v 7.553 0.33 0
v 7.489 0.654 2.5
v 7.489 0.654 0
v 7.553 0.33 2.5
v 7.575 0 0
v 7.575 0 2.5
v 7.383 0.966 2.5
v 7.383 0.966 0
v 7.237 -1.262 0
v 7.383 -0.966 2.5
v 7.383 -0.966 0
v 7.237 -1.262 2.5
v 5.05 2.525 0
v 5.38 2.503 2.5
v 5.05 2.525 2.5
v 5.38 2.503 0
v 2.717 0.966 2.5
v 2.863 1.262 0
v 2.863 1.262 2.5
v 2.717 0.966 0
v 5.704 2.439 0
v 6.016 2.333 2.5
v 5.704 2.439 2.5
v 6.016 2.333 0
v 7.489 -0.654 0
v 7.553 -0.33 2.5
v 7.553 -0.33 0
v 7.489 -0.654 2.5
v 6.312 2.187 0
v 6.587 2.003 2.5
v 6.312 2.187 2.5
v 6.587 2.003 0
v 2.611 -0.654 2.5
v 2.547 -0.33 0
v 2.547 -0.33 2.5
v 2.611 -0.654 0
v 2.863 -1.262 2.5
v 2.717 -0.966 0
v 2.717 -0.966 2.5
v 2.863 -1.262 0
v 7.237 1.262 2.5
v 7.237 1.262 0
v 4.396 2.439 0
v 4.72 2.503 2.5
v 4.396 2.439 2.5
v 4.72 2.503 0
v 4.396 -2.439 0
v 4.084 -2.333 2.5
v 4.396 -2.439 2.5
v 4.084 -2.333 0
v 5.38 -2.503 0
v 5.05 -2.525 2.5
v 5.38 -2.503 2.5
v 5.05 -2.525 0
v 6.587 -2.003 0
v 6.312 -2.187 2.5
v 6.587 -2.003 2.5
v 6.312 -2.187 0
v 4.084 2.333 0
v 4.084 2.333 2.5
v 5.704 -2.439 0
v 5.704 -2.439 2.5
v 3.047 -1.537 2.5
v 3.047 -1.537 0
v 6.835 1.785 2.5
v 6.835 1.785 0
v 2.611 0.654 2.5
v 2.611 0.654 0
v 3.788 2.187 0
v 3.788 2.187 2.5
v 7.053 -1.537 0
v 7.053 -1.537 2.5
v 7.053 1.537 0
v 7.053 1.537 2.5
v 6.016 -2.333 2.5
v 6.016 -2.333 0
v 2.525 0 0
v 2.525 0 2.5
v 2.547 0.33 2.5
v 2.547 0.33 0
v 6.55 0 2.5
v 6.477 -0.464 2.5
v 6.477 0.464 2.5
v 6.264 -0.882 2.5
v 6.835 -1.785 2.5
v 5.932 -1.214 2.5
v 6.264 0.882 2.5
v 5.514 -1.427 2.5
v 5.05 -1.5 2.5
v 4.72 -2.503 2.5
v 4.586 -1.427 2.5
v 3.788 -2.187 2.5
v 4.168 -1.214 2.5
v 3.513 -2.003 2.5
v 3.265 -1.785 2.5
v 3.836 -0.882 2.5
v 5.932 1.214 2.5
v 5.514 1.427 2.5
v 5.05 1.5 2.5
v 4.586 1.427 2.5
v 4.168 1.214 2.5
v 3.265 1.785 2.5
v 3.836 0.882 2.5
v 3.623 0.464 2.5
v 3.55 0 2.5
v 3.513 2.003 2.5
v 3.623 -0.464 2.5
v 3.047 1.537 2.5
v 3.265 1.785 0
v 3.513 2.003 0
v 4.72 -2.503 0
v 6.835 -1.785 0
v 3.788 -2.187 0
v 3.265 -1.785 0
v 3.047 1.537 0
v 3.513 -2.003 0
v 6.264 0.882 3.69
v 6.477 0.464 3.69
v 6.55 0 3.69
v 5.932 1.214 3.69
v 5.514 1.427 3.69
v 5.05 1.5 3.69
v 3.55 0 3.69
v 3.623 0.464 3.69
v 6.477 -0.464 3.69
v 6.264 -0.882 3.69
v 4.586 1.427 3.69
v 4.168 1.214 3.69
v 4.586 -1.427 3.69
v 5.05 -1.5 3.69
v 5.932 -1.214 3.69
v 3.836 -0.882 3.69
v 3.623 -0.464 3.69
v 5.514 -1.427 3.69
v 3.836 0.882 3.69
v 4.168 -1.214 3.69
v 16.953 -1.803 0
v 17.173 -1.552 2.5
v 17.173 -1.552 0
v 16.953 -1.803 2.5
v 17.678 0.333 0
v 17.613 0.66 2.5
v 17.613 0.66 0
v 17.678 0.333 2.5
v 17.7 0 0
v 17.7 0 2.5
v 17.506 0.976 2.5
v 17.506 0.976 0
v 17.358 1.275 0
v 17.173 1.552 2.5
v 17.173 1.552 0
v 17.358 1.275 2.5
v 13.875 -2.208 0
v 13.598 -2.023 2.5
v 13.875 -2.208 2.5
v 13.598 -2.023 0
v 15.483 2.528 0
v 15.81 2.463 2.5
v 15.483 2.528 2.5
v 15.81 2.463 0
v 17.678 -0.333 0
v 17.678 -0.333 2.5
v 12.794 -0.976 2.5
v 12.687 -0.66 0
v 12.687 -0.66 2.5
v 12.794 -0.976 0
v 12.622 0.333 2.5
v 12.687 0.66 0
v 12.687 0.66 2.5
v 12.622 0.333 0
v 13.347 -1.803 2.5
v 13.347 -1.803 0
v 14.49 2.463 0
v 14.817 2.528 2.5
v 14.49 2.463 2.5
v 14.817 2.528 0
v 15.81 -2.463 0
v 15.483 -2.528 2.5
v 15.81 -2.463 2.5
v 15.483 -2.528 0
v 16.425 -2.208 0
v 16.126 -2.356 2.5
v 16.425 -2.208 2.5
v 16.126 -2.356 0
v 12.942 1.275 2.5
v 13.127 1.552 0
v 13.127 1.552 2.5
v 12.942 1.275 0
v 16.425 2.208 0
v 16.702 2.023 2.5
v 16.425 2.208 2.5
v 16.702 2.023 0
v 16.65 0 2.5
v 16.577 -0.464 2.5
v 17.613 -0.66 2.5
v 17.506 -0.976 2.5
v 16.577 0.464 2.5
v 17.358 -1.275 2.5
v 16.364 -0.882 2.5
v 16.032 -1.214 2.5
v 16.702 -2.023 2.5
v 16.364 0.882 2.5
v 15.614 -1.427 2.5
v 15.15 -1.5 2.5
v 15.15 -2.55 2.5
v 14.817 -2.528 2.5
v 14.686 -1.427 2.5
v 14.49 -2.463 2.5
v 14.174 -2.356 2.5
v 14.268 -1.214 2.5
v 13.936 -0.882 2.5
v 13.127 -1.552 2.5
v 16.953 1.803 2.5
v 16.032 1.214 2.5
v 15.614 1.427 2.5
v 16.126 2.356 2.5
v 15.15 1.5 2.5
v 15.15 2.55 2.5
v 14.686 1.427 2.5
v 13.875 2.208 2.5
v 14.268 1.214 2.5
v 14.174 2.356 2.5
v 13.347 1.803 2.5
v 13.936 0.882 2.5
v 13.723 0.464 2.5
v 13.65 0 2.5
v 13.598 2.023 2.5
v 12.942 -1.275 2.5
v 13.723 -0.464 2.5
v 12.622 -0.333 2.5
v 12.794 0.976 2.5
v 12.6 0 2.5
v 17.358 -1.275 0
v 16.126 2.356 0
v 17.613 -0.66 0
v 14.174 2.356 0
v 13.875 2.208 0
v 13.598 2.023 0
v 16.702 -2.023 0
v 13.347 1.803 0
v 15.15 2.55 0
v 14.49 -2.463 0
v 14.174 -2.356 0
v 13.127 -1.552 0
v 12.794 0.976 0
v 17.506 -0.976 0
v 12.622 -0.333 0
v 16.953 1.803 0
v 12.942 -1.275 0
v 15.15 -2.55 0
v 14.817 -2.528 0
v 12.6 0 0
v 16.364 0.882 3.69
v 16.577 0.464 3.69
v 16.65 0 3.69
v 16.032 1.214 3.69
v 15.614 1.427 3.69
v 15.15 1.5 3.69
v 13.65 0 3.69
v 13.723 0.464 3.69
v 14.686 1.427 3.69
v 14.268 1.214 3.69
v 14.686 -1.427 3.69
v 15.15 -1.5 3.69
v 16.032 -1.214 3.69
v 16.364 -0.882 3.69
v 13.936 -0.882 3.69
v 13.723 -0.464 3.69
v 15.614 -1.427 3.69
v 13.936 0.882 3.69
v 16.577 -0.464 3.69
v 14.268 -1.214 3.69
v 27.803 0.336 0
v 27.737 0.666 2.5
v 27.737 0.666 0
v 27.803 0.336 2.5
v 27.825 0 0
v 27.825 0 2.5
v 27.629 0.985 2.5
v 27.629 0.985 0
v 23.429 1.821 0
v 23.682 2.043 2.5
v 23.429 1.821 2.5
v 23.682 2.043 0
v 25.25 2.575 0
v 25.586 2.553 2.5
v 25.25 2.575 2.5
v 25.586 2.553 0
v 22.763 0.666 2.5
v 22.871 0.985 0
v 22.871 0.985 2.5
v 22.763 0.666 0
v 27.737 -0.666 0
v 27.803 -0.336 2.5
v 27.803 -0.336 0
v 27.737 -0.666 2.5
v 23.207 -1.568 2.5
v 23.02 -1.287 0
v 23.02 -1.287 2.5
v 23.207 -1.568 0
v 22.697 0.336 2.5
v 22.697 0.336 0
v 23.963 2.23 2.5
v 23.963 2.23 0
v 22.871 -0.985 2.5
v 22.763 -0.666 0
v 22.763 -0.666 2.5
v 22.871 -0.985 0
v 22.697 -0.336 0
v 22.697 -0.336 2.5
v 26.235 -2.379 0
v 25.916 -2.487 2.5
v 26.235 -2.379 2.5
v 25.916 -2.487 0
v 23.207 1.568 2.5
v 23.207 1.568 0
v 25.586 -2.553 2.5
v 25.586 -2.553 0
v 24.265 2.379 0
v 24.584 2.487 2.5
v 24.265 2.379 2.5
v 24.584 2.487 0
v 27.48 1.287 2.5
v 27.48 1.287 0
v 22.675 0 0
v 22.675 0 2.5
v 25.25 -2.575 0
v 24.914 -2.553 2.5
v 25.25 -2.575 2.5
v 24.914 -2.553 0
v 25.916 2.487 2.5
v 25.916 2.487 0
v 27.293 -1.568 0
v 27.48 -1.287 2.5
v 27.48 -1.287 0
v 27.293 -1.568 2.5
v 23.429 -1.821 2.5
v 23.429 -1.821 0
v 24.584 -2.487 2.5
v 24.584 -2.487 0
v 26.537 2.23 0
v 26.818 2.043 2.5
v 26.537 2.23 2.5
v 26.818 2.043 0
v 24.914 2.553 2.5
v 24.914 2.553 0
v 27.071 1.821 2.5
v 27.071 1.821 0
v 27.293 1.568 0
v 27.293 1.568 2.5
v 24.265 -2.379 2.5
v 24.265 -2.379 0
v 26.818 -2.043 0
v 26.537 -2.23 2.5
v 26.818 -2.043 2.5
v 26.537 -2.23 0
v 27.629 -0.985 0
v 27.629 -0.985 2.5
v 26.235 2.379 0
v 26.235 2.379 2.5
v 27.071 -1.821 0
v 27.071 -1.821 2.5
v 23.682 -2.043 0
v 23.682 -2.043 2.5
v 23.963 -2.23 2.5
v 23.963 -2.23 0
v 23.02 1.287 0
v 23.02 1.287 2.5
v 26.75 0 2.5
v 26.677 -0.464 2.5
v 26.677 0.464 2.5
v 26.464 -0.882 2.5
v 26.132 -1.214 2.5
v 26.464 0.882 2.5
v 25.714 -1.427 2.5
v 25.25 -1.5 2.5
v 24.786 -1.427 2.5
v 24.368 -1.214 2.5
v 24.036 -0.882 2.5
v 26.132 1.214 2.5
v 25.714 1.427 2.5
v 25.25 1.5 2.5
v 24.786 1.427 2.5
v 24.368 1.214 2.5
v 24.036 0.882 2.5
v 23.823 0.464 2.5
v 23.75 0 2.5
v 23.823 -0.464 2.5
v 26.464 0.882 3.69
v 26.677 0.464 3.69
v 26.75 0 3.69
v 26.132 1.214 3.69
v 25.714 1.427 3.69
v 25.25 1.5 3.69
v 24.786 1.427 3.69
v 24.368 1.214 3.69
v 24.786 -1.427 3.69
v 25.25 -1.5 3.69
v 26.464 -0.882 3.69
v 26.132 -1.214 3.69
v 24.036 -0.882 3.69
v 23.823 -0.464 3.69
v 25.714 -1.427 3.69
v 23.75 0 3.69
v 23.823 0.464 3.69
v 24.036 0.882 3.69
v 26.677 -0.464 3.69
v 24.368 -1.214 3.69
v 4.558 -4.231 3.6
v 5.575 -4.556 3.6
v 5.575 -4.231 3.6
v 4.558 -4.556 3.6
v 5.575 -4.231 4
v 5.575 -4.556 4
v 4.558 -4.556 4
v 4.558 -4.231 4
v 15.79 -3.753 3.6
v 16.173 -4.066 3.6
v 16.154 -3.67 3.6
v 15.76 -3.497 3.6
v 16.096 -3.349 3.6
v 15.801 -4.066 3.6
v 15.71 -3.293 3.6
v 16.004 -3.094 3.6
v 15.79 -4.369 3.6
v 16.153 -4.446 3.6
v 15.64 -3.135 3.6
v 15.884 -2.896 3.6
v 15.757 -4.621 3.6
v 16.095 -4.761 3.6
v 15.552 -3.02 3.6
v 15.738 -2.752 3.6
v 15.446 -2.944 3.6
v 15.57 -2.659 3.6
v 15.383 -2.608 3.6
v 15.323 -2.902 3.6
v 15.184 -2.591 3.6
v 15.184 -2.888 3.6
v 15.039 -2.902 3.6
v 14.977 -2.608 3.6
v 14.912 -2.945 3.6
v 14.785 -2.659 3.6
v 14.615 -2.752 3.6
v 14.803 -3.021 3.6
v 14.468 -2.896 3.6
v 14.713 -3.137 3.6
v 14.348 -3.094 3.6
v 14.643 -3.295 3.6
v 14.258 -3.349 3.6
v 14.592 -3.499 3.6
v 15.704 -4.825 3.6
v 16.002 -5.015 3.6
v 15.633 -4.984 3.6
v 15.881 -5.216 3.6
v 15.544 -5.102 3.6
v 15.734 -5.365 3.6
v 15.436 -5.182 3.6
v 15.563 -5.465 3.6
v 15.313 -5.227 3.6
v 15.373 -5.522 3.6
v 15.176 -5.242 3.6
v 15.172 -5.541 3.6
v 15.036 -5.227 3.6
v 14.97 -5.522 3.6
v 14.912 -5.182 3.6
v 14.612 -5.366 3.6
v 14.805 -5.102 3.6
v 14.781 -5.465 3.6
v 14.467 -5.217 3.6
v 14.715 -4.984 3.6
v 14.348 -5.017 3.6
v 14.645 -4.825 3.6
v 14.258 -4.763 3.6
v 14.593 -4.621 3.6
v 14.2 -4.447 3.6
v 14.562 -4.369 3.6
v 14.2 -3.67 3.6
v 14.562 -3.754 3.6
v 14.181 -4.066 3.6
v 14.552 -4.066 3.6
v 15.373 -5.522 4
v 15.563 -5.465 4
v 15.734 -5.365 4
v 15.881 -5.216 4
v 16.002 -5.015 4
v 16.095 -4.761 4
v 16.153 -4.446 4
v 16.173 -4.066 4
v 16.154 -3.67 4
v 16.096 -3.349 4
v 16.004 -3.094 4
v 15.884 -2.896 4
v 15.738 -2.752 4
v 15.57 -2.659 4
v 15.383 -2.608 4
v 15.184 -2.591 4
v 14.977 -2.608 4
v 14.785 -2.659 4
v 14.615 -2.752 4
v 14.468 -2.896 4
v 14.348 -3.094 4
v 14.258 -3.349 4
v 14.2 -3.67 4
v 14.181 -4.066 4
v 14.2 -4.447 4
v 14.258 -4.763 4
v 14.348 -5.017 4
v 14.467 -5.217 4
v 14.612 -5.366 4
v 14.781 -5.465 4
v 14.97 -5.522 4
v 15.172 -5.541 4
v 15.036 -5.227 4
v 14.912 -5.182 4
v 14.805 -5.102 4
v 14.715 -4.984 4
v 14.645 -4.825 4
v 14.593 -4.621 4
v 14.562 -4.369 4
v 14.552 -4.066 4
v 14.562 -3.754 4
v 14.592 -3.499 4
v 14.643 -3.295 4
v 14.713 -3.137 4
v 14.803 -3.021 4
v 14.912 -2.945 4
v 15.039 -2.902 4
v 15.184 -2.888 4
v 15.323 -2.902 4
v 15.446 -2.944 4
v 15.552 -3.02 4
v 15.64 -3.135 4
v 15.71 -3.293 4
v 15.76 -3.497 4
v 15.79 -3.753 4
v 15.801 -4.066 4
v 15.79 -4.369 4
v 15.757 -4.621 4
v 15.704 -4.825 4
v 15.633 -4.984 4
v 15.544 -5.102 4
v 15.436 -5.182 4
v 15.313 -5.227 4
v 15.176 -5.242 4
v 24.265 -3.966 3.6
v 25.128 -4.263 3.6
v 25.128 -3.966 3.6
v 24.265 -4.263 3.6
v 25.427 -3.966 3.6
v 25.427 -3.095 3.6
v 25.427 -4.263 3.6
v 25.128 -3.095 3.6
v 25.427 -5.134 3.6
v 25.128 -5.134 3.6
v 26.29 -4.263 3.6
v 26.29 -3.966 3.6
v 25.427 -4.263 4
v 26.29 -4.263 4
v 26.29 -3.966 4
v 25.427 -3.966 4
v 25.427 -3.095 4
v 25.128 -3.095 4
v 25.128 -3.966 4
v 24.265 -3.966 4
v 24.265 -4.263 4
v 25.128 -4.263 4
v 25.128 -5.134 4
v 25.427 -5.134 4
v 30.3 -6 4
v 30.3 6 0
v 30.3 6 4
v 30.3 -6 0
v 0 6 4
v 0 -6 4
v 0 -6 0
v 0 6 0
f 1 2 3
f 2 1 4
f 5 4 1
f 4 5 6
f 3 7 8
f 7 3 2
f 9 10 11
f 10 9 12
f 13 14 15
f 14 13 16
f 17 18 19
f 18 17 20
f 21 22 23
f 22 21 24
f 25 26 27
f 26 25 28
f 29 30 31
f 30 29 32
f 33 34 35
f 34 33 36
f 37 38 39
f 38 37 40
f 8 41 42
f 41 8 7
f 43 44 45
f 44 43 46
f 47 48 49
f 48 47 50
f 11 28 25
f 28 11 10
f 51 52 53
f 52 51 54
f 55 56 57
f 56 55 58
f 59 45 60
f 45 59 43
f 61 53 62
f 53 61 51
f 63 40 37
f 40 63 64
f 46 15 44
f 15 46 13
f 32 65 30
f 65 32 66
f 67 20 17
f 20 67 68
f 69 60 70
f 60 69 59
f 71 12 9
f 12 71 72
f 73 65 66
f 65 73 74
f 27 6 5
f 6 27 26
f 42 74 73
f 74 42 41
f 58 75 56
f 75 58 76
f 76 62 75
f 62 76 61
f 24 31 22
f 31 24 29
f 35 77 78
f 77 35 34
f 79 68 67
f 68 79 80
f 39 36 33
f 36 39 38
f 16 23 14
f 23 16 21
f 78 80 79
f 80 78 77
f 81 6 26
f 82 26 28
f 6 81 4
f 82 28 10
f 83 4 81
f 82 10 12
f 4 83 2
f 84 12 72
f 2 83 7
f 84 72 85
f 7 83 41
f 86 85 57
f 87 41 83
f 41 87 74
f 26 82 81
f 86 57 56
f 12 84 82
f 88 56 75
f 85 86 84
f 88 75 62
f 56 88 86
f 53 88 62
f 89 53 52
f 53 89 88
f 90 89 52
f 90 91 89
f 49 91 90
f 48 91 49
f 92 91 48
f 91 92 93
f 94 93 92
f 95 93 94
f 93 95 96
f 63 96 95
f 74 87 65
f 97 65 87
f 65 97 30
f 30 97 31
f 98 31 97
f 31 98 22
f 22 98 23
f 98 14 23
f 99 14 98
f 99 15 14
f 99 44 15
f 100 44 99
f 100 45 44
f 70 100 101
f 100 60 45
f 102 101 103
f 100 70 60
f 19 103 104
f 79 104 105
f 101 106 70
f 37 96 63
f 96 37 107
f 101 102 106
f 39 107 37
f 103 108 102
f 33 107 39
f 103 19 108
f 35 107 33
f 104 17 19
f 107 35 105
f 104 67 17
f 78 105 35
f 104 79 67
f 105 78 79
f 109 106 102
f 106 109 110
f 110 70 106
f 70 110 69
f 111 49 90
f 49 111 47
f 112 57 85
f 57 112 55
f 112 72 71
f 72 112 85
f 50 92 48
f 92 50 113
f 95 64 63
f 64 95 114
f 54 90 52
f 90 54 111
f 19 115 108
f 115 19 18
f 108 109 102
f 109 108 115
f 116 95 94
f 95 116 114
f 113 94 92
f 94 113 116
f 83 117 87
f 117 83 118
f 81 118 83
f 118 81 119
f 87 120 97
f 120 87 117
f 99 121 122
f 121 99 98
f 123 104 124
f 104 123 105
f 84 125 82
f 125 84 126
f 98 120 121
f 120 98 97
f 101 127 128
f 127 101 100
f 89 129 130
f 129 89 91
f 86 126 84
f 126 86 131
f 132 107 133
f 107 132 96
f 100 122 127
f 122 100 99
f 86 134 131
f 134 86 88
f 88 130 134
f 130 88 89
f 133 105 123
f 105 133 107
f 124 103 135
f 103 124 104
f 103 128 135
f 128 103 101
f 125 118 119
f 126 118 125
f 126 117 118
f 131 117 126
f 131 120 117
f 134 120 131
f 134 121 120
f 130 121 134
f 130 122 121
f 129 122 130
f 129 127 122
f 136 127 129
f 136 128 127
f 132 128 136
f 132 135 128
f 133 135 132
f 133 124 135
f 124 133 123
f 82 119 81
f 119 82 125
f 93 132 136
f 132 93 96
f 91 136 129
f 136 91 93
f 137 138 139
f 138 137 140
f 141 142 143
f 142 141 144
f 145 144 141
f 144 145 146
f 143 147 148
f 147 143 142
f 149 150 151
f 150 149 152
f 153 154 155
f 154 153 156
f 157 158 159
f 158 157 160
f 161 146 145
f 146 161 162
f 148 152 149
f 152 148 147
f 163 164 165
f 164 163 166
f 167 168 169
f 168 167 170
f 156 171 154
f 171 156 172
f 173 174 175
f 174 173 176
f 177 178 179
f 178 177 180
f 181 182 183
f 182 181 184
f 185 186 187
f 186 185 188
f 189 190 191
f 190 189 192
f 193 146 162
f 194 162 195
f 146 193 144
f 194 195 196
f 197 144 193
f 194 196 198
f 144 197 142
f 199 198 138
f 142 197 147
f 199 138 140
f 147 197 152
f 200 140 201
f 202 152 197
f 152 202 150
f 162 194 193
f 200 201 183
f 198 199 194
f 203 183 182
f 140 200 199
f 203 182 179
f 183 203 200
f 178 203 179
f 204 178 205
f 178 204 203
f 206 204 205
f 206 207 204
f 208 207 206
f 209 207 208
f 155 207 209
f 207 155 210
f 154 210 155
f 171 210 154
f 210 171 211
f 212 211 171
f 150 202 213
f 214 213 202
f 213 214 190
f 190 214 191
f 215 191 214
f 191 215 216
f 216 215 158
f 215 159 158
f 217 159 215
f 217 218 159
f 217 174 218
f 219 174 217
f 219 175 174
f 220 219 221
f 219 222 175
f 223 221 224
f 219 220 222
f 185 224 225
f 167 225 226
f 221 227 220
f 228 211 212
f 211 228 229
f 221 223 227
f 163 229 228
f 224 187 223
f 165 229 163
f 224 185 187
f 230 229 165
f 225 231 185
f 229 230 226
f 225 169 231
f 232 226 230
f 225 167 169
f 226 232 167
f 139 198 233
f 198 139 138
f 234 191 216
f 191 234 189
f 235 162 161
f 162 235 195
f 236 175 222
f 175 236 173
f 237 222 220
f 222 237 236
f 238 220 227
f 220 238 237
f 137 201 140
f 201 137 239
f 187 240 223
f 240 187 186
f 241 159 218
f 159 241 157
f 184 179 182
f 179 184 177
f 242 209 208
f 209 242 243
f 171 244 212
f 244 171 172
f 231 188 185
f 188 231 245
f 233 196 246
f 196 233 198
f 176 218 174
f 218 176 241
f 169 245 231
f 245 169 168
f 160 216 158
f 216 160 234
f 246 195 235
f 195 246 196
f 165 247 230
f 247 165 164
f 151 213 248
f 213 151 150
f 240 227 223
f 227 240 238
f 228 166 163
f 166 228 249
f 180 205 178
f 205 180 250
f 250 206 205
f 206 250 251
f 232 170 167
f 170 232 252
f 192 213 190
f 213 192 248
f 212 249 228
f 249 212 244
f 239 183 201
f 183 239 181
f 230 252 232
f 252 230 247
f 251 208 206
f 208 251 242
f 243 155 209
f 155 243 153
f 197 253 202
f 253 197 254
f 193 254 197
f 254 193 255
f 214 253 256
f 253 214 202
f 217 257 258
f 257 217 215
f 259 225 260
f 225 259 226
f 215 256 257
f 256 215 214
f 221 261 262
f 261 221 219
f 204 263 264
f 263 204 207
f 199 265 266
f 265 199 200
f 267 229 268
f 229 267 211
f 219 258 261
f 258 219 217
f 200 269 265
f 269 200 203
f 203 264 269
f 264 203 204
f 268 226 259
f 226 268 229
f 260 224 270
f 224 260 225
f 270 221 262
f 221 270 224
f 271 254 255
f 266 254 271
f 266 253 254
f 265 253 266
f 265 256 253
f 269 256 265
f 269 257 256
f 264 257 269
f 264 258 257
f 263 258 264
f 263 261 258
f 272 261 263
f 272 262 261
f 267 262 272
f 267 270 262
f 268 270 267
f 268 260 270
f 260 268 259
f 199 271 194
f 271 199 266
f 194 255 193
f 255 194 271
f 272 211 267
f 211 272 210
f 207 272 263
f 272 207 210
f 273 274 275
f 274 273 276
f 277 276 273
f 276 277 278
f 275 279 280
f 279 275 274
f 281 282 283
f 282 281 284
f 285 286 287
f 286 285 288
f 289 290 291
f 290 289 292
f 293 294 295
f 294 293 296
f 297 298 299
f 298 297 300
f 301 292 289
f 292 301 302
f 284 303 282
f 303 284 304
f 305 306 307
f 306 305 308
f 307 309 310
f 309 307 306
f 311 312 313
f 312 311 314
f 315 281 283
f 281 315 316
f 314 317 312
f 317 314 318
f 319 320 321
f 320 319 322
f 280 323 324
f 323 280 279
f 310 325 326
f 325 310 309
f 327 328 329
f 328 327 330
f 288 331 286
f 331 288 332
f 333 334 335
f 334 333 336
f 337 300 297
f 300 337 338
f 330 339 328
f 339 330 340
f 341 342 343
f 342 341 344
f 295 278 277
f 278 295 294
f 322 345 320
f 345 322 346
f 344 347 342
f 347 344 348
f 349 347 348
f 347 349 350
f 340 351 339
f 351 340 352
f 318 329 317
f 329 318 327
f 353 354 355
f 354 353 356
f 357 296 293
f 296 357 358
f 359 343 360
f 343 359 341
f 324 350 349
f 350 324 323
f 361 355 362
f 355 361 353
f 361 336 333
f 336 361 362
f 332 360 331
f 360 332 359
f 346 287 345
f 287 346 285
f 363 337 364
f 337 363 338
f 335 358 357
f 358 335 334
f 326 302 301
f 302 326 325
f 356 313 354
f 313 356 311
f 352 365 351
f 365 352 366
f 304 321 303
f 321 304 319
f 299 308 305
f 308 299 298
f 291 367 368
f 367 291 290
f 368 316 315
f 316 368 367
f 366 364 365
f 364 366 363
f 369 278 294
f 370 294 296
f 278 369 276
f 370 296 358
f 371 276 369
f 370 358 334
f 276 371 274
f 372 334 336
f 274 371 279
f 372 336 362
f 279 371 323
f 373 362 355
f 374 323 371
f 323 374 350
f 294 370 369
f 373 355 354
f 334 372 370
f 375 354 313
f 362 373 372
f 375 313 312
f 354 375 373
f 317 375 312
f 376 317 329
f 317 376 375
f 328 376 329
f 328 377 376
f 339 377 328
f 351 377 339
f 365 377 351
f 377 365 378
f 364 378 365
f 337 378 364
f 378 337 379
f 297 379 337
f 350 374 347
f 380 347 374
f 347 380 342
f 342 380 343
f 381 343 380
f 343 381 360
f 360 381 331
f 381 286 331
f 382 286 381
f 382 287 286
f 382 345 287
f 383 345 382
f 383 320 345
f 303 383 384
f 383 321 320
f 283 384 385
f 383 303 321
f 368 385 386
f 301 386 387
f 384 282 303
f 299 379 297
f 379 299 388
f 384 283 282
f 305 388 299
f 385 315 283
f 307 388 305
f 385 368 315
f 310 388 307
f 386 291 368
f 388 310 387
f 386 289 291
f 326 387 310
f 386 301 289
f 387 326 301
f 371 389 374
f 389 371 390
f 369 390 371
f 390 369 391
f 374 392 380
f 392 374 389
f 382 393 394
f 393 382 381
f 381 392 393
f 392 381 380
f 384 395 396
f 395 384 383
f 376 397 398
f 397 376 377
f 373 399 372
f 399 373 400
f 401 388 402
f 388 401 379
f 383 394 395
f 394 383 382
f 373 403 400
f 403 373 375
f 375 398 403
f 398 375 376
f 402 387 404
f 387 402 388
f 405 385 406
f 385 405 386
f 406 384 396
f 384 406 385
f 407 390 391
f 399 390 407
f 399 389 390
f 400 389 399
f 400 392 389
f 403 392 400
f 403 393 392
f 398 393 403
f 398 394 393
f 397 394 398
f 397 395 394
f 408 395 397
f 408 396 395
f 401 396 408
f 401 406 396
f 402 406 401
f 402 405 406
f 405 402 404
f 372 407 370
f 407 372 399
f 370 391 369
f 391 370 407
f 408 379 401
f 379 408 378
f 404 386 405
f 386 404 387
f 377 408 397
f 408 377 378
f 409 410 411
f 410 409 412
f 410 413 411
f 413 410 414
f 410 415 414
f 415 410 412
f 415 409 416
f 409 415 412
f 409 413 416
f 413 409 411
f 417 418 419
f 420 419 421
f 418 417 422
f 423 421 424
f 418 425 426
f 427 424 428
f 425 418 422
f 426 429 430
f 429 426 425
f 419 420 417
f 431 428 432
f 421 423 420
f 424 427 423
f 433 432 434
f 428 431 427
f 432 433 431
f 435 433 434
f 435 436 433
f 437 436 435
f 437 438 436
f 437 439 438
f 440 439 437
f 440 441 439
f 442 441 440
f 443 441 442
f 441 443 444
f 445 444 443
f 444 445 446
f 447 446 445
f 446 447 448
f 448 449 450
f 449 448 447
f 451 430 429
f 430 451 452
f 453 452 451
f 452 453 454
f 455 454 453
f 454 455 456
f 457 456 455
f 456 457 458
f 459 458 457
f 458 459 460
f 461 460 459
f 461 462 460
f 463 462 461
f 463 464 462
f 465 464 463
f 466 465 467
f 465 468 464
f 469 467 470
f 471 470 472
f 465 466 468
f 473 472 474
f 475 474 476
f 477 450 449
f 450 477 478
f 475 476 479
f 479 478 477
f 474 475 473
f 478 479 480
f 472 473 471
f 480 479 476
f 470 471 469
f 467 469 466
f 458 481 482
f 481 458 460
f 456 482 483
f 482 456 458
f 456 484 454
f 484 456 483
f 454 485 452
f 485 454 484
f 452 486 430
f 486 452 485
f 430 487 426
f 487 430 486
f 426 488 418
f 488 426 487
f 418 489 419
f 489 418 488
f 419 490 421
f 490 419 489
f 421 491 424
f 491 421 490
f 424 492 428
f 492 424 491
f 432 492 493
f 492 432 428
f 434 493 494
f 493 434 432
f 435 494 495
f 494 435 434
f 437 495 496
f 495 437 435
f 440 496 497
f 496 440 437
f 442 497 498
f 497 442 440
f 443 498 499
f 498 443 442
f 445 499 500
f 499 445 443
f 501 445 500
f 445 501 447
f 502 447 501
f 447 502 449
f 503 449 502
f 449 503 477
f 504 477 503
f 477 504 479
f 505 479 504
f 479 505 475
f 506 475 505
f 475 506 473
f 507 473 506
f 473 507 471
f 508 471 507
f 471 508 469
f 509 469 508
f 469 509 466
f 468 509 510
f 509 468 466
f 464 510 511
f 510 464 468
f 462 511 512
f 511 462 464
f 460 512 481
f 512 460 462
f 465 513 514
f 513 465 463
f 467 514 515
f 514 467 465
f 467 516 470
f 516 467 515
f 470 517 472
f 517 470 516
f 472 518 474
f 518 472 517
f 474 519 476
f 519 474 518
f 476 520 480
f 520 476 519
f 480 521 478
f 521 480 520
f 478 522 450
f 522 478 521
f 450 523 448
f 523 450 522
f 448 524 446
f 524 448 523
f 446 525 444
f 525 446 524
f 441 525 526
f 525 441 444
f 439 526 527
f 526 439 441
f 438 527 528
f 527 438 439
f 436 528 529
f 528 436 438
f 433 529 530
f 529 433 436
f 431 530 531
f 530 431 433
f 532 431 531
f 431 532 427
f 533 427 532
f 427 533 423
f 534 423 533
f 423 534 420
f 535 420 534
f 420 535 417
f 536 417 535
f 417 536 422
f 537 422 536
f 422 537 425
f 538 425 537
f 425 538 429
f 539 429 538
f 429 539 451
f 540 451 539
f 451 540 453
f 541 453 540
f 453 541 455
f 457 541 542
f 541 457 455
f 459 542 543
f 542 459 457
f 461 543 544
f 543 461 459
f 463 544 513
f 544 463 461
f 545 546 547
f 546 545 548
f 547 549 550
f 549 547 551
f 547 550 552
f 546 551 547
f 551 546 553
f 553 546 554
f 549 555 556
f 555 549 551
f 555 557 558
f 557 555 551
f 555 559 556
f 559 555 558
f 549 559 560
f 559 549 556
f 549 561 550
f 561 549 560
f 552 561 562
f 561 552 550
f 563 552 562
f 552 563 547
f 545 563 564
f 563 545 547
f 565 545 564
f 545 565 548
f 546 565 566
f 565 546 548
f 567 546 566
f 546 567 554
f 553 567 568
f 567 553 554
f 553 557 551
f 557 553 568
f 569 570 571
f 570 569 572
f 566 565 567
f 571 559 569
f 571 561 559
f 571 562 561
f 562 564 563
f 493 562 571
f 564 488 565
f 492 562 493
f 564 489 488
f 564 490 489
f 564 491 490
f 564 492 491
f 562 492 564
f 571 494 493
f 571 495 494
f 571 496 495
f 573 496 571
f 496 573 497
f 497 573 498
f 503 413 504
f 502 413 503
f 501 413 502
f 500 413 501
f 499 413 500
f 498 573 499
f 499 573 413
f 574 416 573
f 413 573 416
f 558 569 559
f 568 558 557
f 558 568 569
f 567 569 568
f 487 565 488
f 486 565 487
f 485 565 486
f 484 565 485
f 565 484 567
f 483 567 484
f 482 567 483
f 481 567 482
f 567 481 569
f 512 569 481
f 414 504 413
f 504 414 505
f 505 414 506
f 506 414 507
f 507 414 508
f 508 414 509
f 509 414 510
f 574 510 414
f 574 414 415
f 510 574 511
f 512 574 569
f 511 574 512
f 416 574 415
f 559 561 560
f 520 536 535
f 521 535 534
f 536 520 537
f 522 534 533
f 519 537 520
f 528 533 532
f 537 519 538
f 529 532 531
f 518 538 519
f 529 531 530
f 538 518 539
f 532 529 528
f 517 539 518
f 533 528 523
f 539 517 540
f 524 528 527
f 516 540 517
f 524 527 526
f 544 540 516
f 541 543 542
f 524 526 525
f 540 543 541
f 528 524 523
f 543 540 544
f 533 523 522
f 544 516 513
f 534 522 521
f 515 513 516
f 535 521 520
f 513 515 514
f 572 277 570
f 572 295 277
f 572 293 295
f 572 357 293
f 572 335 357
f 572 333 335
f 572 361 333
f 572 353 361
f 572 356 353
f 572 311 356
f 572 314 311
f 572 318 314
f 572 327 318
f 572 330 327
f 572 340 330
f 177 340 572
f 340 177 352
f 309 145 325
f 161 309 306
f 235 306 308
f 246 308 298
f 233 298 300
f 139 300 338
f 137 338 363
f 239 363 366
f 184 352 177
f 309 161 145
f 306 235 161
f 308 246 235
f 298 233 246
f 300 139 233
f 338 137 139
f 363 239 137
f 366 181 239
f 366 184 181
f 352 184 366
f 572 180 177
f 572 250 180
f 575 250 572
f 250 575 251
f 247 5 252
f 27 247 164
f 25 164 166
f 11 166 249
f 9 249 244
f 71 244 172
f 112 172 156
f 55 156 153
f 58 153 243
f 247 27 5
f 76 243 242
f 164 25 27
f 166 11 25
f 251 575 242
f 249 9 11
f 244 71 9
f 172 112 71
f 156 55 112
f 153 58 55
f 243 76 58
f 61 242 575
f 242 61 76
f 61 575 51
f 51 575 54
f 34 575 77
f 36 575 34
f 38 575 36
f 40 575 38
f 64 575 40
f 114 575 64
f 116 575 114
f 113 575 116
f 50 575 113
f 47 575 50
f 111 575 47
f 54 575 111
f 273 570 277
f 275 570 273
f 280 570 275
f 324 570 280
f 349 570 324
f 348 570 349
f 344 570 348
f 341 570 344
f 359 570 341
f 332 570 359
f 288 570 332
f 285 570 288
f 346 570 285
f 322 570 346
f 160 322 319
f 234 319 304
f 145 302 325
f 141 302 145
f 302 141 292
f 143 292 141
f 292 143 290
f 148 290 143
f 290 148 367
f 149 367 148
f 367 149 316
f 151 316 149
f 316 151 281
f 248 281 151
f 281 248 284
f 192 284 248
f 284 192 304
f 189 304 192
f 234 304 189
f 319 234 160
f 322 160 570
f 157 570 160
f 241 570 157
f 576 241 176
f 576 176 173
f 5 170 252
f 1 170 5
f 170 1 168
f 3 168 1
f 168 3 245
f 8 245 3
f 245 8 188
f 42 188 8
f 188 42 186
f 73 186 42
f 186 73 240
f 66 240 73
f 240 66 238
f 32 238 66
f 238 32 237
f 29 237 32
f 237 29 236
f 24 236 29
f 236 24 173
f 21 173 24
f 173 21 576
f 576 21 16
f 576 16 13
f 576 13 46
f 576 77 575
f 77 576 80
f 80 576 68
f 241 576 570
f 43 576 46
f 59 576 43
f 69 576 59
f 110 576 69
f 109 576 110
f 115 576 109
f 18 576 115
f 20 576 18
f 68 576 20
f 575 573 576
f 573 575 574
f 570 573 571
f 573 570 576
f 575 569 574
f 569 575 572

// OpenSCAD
// Milwaukee Road Little Joe, O scale 1-48 - print 17 of 17: bearing_coupon - bearing fit test - print first
// Render (F6), export STL, print. Settings: ../../library/lj_params.scad
// Whole loco preview and notes: ../../MILW_LittleJoe_Main.scad
SCALE_SEL = "O";
LOCO_SEL = "E70";   // [E20, E21, E70, E71, E72, E73, E74, E75, E76, E77, E78, E79] the body and roof change for E20 / E21
include <../../library/lj_all.scad>
lj_plate("bearing_coupon");
